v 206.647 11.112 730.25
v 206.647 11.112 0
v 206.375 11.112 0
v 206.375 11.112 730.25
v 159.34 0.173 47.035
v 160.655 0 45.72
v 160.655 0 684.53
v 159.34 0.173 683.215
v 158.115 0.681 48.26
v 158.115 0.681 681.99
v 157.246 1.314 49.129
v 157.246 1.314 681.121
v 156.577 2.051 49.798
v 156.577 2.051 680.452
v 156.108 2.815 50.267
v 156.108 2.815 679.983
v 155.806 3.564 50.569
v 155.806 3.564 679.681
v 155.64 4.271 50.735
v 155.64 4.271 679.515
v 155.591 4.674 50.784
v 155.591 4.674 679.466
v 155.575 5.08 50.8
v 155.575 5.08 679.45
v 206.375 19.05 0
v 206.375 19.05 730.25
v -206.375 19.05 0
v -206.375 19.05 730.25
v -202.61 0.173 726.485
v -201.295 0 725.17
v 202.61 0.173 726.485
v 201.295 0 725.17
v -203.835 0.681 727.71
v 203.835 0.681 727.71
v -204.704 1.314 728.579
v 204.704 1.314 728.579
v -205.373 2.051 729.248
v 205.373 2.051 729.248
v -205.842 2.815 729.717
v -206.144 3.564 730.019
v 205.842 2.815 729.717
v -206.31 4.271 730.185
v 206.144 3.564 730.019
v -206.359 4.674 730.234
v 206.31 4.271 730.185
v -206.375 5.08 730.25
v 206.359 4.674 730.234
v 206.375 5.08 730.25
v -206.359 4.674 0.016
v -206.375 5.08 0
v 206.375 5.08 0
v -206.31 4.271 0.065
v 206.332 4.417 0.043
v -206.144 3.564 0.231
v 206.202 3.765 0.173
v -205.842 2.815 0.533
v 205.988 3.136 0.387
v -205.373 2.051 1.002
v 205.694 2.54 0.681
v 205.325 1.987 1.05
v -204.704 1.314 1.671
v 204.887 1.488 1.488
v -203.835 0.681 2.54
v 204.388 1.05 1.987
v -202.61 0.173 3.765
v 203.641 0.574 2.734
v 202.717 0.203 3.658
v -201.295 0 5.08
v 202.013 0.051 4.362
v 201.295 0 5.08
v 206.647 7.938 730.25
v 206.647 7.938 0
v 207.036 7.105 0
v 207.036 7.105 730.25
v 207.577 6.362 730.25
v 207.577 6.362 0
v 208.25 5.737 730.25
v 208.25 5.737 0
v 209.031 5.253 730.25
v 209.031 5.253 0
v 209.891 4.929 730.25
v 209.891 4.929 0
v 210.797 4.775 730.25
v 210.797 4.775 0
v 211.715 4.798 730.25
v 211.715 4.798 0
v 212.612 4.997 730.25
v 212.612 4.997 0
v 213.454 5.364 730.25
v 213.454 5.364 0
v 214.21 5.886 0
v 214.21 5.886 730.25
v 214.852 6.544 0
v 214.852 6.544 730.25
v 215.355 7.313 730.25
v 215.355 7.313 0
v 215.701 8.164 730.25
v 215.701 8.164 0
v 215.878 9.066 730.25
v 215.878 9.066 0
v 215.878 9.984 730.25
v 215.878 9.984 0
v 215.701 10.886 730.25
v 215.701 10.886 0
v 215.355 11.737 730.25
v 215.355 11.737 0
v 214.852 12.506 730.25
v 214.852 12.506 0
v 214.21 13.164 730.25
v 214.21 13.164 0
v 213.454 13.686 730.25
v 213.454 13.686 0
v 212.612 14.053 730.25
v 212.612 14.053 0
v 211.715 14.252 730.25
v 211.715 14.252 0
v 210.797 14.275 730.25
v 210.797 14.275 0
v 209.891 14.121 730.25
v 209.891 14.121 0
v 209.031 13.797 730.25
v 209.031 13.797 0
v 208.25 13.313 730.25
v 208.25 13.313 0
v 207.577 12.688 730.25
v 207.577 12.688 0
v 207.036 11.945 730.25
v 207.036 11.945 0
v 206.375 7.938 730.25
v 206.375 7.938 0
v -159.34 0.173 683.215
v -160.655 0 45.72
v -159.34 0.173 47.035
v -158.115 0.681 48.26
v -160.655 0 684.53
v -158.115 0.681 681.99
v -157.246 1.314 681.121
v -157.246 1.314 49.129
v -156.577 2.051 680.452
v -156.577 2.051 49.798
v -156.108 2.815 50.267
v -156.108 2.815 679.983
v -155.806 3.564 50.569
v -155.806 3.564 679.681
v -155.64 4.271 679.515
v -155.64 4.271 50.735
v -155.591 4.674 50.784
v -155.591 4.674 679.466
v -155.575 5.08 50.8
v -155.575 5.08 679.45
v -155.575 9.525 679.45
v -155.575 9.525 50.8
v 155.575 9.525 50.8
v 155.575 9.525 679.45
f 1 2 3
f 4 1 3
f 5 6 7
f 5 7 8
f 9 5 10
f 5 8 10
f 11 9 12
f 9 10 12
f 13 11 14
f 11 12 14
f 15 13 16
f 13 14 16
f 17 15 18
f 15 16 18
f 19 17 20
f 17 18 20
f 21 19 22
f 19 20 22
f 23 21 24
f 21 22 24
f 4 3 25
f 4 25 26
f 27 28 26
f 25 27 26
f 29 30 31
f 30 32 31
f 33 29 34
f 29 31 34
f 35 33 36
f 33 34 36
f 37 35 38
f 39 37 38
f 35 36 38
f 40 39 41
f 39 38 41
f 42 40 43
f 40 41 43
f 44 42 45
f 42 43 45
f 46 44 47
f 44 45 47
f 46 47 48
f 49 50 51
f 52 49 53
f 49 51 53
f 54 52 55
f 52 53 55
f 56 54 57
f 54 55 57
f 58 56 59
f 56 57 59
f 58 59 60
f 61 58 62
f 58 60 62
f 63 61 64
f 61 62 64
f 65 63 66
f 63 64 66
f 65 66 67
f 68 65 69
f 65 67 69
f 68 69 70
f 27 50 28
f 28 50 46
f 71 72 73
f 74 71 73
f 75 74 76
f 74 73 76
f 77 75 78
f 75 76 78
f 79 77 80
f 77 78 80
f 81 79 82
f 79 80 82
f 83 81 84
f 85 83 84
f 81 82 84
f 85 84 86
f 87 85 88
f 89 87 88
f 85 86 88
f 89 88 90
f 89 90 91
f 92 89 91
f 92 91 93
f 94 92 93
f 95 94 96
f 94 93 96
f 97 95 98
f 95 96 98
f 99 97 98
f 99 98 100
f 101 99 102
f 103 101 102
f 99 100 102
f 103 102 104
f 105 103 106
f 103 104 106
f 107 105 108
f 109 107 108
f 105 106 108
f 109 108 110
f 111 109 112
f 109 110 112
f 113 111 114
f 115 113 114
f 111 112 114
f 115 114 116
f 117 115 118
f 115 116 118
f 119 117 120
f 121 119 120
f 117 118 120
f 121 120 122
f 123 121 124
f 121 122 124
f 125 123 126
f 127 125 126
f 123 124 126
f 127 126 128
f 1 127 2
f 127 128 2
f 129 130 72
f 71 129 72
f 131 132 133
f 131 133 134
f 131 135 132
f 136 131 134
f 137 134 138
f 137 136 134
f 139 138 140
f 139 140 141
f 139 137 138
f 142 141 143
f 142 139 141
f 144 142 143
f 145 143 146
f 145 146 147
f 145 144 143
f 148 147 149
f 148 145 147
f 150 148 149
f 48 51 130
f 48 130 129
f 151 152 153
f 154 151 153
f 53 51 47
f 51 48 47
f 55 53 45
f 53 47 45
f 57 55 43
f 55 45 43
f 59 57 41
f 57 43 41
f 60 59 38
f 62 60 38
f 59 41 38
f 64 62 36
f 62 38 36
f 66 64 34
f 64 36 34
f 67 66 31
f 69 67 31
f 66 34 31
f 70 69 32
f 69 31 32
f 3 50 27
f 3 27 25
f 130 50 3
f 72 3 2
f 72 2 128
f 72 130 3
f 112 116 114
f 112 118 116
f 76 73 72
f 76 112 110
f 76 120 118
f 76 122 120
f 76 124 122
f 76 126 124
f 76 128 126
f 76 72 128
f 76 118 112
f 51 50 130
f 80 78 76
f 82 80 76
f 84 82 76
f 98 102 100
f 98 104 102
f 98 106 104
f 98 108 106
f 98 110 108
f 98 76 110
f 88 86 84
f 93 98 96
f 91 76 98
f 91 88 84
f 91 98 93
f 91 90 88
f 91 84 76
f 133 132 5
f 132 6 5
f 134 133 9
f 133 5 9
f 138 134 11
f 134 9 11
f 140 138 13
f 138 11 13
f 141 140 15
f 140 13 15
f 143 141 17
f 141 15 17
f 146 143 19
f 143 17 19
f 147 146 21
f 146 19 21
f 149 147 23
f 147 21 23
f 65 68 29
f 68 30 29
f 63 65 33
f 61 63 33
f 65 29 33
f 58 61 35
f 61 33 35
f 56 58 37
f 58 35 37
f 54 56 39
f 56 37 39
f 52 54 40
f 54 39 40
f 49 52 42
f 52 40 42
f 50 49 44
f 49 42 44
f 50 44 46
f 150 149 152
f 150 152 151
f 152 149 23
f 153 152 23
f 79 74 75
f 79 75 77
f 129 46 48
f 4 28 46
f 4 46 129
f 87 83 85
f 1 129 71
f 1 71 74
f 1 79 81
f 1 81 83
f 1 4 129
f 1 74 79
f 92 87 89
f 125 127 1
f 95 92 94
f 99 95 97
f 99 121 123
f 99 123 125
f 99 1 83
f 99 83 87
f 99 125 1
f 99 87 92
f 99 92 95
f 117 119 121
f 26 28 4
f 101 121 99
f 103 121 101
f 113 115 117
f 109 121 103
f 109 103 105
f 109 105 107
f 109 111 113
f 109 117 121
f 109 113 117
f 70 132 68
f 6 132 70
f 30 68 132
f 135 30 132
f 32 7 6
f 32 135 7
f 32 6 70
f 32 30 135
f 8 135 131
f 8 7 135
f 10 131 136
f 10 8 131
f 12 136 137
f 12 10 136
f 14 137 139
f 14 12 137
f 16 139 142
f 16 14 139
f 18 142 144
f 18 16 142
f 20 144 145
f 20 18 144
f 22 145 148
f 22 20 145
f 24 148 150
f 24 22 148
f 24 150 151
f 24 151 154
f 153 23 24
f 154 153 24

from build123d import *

# Parameters (mm, degrees)
F0_W     = 412.75
F0_H     = 730.25
F1_DEPTH = 19.05
F3_DEPTH = 730.25
F4_W     = 311.15
F4_H     = 628.65
F5_DEPTH = 9.525
F6_R     = 5.08


with BuildPart() as f1:
    # F0 (on Front) → F1 (new body)
    with BuildSketch(Plane.XZ):
        with Locations((0, 365.125)):
            Rectangle(F0_W, F0_H)
    extrude(amount=-F1_DEPTH)

    # F2 (on Top) → F3 (join, through all)
    with BuildSketch(Plane.XY):
        with BuildLine():
            Line((204.7875, 7.9375), (206.6473719395, 7.9375))
            ThreePointArc((206.6473719395, 7.9375), (215.9, 9.525), (206.6473719395, 11.1125))
            Line((206.6473719395, 11.1125), (204.7875, 11.1125))
            Line((204.7875, 11.1125), (204.7875, 7.9375))
        make_face()
    extrude(amount=F3_DEPTH)

    # F4 (on Front) → F5 (cut)
    with BuildSketch(Plane.XZ):
        with Locations((0, 365.125)):
            Rectangle(F4_W, F4_H)
    extrude(amount=-F5_DEPTH, mode=Mode.SUBTRACT)

    # F6
    f6_edges = [f1.edges().sort_by_distance(p)[0] for p in [
        (-206.375, 0, 365.125),
        (0, 0, 730.25),
        (0, 0, 0),
        (206.375, 0, 365.125),
        (155.575, 0, 365.125),
        (0, 0, 679.45),
        (-155.575, 0, 365.125),
        (0, 0, 50.8),
    ]]
    fillet(f6_edges, radius=F6_R)


solid = f1.part
